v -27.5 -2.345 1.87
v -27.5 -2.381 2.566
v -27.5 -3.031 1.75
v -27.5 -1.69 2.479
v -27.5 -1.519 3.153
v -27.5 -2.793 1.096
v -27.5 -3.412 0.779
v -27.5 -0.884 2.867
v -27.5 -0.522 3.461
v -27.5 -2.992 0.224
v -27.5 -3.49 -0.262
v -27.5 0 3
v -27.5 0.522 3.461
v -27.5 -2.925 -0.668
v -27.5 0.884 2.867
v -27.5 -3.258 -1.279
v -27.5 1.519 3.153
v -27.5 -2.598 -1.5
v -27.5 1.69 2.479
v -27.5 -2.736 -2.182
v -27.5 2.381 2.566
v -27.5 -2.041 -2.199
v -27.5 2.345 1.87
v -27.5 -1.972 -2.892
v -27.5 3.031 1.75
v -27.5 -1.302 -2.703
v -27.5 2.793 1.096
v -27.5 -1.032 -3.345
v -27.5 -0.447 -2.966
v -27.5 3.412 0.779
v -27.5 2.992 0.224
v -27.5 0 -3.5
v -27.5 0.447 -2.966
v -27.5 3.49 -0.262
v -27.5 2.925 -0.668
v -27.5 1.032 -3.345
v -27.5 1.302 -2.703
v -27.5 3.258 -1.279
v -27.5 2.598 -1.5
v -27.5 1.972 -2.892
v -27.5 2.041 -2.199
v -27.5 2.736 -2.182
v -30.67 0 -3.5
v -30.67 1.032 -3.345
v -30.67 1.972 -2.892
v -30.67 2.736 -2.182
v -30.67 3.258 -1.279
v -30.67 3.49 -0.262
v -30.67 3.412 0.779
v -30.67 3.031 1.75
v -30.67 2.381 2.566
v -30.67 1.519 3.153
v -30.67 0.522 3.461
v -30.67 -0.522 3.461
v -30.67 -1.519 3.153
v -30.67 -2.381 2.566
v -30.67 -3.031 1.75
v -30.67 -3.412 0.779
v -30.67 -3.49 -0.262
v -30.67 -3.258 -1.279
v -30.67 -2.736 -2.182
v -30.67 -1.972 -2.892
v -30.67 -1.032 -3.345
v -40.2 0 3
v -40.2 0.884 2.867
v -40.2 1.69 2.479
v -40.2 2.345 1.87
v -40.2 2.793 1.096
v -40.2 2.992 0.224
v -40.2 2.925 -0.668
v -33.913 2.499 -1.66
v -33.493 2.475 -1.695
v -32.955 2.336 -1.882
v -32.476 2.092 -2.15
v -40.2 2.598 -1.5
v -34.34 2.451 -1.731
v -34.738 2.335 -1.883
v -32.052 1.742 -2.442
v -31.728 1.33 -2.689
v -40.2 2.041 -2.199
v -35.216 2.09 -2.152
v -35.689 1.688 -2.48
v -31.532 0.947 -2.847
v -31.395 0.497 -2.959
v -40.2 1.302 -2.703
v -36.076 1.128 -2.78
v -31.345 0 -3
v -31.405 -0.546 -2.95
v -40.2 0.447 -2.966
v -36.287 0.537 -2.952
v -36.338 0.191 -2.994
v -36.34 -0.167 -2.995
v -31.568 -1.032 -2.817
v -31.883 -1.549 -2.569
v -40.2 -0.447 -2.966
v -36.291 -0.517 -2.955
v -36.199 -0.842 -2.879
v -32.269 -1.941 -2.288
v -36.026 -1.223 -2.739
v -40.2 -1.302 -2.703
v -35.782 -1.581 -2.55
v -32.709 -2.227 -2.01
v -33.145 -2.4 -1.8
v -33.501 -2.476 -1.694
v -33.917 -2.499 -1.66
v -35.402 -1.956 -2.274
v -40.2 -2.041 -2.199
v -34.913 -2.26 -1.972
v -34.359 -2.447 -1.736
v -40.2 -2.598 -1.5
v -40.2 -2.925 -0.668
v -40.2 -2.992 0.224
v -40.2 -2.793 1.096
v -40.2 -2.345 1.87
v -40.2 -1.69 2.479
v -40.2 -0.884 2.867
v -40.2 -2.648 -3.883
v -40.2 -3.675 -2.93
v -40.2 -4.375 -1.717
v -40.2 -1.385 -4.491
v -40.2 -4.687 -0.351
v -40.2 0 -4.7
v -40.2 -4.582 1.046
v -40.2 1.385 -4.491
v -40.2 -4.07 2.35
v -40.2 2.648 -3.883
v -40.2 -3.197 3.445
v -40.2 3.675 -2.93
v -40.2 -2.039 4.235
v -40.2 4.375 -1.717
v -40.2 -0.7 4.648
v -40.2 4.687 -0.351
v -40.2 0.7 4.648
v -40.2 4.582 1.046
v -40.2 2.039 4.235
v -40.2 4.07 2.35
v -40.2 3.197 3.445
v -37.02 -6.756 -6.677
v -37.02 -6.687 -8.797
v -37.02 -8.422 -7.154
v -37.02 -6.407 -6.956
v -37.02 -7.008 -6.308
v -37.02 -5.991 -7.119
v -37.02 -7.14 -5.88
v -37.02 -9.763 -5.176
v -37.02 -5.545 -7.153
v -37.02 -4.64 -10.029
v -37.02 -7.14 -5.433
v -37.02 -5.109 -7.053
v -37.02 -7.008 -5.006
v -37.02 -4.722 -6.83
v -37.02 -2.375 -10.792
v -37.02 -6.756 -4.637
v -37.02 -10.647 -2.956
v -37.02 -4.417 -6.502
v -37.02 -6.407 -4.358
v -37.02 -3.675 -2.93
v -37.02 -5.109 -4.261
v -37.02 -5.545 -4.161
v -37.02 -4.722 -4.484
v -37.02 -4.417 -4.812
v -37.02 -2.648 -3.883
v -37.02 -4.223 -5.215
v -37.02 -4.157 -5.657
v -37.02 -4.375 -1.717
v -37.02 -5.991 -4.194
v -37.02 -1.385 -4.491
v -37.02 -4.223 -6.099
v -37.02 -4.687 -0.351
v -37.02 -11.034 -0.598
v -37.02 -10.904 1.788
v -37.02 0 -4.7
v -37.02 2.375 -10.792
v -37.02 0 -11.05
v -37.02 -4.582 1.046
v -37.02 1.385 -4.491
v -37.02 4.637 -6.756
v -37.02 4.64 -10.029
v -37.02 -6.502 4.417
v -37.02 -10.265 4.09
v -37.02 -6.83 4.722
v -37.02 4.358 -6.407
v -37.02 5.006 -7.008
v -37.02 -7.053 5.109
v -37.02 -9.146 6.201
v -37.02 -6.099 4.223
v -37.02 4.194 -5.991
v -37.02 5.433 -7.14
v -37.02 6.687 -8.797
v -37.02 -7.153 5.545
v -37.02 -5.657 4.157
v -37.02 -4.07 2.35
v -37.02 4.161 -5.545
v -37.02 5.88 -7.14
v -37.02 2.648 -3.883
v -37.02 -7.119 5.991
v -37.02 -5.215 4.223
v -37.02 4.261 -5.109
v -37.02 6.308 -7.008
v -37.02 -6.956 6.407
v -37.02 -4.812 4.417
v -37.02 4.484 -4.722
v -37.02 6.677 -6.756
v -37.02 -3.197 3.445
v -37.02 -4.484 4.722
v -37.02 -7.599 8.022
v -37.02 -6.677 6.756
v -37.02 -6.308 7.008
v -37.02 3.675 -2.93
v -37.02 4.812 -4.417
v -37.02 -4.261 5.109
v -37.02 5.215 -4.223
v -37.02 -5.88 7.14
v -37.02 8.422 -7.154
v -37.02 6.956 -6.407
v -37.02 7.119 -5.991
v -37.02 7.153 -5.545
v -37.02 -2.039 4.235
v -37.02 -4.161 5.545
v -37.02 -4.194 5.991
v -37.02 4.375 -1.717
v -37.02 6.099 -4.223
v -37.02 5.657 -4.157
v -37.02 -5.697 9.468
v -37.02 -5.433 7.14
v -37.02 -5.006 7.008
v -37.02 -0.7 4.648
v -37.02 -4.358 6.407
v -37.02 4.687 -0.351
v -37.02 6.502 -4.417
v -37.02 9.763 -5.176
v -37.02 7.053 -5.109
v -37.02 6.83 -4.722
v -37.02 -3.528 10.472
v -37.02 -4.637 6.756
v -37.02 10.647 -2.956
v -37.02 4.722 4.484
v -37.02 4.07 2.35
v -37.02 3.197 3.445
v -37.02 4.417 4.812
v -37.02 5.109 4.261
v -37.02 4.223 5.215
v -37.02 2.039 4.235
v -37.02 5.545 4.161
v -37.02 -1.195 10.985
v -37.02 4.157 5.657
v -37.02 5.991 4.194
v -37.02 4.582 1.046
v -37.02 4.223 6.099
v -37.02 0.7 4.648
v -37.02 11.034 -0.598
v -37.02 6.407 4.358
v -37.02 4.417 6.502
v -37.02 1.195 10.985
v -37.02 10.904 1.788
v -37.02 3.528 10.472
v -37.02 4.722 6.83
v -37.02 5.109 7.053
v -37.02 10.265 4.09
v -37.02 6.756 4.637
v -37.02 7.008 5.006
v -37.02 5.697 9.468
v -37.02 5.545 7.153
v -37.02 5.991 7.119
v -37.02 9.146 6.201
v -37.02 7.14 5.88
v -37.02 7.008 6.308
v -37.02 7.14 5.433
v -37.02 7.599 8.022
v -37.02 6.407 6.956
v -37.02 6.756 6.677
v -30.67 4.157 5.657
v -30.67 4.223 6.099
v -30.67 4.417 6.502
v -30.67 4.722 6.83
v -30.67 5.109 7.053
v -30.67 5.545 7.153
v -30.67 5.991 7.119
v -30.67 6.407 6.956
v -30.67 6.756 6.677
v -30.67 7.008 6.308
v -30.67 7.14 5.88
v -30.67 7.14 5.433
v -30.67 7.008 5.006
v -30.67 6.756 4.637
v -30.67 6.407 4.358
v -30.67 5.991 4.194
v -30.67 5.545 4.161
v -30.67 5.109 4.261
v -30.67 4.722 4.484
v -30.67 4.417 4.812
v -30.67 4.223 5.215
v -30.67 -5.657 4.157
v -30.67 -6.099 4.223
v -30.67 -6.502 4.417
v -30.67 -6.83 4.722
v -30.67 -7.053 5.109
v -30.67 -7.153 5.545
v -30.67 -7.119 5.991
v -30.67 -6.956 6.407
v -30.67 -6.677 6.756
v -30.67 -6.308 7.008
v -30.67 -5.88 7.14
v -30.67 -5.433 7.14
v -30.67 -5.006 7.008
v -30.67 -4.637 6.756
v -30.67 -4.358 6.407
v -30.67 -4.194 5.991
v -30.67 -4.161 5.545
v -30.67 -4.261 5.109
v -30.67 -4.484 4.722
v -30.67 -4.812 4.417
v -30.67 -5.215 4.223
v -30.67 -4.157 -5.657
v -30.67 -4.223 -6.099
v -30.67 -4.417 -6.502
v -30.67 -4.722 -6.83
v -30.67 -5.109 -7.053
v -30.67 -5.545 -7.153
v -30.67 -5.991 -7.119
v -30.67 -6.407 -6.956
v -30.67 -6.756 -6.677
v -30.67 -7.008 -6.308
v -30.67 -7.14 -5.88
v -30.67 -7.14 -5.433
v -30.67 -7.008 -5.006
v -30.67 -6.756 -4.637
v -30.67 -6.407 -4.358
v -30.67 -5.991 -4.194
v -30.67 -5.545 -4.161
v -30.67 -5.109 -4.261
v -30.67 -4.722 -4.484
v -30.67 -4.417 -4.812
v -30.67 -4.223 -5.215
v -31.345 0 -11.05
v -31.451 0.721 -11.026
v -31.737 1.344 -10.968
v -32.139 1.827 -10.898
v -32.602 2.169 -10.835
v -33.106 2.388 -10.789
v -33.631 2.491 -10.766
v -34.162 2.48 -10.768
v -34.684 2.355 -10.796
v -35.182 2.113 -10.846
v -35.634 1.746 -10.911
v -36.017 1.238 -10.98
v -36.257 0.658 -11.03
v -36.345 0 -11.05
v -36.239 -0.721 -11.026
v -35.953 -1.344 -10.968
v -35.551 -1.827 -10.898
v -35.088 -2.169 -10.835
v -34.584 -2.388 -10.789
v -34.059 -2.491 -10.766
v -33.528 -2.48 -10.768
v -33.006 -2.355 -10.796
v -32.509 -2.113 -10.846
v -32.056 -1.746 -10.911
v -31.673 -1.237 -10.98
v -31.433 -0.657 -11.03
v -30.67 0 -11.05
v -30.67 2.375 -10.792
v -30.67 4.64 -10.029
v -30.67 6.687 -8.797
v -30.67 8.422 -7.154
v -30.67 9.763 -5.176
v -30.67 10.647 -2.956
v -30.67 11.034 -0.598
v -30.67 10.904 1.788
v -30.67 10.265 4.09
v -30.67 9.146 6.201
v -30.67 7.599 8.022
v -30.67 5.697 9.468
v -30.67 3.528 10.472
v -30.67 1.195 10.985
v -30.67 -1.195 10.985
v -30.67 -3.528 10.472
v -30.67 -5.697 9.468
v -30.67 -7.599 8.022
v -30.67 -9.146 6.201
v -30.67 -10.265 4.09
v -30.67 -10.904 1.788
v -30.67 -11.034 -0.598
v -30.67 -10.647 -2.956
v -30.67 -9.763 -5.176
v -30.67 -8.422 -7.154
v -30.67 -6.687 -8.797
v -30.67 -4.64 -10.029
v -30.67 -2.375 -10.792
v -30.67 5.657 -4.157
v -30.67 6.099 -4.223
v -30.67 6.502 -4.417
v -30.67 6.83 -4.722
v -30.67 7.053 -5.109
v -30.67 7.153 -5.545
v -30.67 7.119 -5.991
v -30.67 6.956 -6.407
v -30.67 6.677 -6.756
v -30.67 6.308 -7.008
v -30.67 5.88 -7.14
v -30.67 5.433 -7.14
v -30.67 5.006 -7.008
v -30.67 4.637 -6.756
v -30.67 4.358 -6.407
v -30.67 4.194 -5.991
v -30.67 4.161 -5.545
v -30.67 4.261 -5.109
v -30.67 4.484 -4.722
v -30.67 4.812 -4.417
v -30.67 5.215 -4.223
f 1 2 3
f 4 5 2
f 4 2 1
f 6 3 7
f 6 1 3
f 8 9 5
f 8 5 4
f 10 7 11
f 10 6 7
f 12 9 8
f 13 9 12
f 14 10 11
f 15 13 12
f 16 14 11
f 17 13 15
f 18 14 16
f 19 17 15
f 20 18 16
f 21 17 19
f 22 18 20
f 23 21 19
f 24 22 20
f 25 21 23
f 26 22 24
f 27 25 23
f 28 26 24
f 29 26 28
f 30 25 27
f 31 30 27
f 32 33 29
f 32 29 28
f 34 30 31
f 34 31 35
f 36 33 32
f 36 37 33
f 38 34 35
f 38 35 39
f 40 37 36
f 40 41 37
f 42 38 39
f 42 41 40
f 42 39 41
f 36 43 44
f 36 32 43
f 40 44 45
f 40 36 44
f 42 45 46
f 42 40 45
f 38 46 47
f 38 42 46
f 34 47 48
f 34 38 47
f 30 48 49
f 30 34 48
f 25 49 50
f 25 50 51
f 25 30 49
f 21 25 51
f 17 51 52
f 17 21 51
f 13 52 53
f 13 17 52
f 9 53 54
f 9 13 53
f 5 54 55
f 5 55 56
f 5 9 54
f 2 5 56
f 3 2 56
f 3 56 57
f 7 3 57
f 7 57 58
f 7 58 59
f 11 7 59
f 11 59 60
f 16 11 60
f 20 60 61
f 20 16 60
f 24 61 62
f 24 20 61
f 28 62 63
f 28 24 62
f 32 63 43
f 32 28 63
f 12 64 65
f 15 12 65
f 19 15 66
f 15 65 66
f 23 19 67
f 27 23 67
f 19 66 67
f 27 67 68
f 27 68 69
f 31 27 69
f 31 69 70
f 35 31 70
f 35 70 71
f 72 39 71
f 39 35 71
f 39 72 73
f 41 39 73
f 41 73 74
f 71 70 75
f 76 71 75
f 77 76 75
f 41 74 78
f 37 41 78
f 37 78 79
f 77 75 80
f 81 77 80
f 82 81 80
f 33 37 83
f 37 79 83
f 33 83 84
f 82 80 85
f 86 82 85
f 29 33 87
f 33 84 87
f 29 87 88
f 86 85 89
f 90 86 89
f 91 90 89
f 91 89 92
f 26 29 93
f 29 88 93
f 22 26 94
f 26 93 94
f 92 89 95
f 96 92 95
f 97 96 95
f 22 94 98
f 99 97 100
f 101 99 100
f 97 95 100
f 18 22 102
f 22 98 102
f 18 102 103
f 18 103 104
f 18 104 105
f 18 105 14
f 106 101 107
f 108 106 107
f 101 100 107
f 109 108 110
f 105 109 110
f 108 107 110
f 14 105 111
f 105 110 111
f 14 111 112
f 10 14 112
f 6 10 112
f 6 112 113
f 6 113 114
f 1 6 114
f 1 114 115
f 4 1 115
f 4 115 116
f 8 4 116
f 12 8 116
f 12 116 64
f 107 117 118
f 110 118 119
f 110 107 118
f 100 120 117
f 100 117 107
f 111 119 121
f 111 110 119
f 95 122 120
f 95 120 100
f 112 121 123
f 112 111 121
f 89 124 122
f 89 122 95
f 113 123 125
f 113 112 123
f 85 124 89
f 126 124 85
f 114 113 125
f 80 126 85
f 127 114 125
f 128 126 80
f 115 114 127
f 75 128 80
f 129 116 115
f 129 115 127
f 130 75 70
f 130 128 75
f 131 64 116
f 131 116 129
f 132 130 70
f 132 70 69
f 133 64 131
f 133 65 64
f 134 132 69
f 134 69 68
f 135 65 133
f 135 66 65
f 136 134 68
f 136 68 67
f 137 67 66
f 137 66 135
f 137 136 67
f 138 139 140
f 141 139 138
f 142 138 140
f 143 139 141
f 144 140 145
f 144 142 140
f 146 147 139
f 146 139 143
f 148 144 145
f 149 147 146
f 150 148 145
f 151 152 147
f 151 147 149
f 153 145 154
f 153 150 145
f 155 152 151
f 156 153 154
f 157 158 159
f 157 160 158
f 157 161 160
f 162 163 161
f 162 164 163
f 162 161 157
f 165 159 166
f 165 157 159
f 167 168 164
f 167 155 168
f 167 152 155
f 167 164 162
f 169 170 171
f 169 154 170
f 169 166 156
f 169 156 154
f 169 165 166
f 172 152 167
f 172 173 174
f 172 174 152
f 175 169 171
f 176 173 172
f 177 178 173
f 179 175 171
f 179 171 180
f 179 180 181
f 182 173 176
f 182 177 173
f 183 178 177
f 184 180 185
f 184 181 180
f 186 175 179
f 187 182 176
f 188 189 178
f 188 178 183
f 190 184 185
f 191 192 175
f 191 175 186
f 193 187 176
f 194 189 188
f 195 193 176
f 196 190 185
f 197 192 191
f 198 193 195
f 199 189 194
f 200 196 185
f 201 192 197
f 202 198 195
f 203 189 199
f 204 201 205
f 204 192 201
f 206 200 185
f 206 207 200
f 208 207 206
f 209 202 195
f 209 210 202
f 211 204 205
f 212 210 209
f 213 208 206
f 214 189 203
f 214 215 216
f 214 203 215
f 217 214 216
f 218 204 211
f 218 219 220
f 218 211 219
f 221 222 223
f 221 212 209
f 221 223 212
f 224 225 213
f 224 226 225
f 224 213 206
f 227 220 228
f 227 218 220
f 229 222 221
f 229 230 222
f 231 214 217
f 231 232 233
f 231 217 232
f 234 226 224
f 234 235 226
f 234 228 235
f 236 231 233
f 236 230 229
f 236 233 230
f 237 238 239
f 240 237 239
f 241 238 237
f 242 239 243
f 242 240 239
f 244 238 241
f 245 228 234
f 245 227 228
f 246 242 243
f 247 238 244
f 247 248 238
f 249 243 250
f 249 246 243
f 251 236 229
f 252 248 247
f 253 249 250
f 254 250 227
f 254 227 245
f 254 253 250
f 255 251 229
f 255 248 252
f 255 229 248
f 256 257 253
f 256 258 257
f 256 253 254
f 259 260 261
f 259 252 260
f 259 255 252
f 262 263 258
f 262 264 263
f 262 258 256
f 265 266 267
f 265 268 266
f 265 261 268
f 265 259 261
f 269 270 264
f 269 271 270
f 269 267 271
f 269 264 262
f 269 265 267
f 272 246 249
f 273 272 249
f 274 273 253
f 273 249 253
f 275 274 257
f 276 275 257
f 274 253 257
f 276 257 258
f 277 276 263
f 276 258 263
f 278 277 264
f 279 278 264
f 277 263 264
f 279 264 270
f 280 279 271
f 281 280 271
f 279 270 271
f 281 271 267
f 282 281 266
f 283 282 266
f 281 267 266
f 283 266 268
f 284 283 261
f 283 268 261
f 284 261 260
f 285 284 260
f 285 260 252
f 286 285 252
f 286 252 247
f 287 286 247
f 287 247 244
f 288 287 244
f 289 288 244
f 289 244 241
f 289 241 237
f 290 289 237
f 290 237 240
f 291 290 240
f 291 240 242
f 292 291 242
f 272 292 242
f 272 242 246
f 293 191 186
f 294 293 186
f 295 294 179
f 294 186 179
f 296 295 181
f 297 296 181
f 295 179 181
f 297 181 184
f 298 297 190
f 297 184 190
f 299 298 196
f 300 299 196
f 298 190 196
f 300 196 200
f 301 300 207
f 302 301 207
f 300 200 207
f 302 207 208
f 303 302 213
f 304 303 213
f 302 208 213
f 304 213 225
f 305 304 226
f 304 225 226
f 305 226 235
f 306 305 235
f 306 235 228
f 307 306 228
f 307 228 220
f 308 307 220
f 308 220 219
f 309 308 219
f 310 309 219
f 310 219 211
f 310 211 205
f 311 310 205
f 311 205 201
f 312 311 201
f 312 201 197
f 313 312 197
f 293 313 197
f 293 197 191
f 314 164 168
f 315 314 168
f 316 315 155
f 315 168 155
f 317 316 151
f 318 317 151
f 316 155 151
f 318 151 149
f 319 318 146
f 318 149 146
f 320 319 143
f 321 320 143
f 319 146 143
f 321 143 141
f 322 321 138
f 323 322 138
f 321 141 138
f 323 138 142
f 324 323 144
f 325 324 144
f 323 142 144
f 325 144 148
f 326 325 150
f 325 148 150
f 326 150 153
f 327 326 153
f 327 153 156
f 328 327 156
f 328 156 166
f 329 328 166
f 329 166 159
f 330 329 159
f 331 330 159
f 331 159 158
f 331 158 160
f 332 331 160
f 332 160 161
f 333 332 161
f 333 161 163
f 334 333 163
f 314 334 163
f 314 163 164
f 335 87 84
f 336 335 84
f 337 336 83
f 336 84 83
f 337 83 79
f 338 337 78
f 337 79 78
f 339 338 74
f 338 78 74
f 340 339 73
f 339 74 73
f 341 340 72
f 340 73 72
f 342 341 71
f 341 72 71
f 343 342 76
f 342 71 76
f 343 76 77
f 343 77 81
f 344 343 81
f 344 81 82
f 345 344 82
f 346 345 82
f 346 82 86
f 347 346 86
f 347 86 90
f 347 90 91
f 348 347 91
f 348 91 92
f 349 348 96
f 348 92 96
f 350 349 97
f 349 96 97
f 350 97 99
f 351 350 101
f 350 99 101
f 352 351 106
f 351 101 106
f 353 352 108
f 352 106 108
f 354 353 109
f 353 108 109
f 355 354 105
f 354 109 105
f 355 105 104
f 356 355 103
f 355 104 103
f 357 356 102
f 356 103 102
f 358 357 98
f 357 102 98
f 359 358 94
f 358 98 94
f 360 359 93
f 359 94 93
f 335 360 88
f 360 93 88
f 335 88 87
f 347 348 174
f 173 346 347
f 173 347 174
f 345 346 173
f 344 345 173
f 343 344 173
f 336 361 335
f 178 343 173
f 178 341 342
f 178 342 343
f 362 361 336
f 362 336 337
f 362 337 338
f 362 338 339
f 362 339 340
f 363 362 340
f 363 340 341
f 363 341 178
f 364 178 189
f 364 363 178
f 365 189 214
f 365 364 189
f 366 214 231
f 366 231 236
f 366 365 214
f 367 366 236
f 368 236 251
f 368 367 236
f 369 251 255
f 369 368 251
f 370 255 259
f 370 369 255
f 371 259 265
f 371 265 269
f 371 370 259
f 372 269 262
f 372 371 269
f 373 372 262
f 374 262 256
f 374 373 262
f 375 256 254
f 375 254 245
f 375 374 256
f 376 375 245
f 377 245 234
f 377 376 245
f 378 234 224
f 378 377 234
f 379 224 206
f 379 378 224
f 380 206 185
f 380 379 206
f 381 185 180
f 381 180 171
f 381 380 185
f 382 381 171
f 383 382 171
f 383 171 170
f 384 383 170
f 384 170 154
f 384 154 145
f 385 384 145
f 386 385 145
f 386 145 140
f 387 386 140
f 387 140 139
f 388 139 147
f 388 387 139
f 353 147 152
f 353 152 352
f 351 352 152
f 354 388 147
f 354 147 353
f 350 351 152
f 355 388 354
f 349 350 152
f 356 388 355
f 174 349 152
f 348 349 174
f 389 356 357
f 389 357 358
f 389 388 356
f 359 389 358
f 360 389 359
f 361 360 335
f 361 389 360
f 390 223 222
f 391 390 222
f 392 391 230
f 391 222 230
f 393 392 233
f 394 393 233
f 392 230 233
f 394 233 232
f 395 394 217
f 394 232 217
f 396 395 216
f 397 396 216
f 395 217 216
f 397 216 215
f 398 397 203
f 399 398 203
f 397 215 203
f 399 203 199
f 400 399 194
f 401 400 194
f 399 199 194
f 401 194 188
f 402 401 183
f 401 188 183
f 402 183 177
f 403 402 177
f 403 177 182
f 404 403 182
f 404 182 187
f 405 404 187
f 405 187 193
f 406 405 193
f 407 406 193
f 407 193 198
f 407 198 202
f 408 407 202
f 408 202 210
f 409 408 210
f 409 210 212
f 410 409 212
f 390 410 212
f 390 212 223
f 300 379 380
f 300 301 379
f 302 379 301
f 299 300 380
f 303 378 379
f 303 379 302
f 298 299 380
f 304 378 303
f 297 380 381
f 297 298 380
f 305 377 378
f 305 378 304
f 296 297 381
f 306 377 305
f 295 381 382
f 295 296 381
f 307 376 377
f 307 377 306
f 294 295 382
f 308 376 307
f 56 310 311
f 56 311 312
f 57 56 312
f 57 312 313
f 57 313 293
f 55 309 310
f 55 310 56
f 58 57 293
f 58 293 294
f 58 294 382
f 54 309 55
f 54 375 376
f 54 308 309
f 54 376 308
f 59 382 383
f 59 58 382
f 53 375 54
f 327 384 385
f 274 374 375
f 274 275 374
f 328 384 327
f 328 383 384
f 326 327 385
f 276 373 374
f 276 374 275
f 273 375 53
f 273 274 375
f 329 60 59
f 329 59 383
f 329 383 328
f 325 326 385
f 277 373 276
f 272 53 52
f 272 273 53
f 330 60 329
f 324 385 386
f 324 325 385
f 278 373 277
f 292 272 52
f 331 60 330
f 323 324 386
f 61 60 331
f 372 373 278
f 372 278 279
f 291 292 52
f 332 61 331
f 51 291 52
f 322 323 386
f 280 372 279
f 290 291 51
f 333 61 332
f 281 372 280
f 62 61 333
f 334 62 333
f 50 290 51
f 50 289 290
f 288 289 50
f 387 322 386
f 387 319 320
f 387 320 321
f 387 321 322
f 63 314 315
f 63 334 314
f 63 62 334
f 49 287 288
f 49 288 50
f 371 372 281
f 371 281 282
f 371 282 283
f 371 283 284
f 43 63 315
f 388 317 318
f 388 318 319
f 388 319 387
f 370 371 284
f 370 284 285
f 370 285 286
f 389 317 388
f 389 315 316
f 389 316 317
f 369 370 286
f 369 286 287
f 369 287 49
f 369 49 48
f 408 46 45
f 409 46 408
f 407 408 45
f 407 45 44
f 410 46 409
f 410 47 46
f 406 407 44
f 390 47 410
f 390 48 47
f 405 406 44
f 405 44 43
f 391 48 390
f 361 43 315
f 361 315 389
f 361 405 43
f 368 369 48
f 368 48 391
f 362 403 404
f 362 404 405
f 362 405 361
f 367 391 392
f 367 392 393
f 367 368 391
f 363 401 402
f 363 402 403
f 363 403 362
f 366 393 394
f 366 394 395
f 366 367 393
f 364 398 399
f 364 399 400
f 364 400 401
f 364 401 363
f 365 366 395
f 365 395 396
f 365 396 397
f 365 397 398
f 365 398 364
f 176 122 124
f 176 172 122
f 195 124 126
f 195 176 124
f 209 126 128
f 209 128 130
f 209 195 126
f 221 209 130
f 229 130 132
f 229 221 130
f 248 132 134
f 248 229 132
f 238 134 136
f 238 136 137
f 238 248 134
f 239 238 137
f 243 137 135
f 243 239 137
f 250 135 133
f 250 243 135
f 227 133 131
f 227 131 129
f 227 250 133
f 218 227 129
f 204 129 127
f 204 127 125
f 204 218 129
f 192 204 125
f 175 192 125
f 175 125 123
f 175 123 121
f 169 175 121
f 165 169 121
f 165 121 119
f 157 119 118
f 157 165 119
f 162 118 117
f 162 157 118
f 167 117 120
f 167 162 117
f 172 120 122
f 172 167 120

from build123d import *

# Parameters (mm, degrees)
ESQUISSE2_R                  = 3
ENL_V_MAT_EXTRU_1_DEPTH      = 13.7
ESQUISSE3_R                  = 1.5
ENL_V_MAT_EXTRU_2_DEPTH      = 10
R_P_TITION_CIRCULAIRE1_COUNT = 4
ESQUISSE5_R                  = 2.5
ENL_V_MAT_EXTRU_3_DEPTH      = 12.05


with BuildPart() as part:
    # Esquisse1 → Révolution1 (revolve)
    with BuildSketch(Plane(origin=(0, 0, 0), x_dir=(1, 0, 0), z_dir=(0, 1, 0))):
        Polygon((-40.200130208, 0), (-40.200130208, 4.7), (-37.020130208, 4.7), (-37.020130208, 11.05), (-30.670130208, 11.05), (-30.670130208, 3.5), (-27.500130208, 3.5), (-27.500130208, 0), align=None)
    revolve(axis=Axis((-53.297005208, 0, 0), (1, 0, 0)))

    # Esquisse2 → Enlèv. mat.-Extru.1 (cut, through all)
    with BuildSketch(Plane.ZY.offset(40.200130208)):
        Circle(ESQUISSE2_R)
    extrude(amount=-ENL_V_MAT_EXTRU_1_DEPTH, mode=Mode.SUBTRACT)

    # Esquisse3 → Enlèv. mat.-Extru.2 (cut)
    with BuildSketch(Plane.ZY.offset(37.020130208)):
        with Locations((-5.656854249, 5.656854249)):
            Circle(ESQUISSE3_R)
    enl_v_mat_extru_2 = extrude(amount=-ENL_V_MAT_EXTRU_2_DEPTH, mode=Mode.SUBTRACT)

    # Répétition circulaire1: Enlèv. mat.-Extru.2 ×4 about axis
    r_p_tition_circulaire1_axis = Axis((0, 0, 0), (1, 0, 0))
    for i in range(1, R_P_TITION_CIRCULAIRE1_COUNT):
        add(enl_v_mat_extru_2.rotate(r_p_tition_circulaire1_axis, i * 360 / R_P_TITION_CIRCULAIRE1_COUNT), mode=Mode.SUBTRACT)

    # Esquisse5 → Enlèv. mat.-Extru.3 (cut, through all)
    with BuildSketch(Plane.XY):
        with Locations((-33.845130208, 0)):
            Circle(ESQUISSE5_R)
    extrude(amount=-ENL_V_MAT_EXTRU_3_DEPTH, mode=Mode.SUBTRACT)


solid = part.part
